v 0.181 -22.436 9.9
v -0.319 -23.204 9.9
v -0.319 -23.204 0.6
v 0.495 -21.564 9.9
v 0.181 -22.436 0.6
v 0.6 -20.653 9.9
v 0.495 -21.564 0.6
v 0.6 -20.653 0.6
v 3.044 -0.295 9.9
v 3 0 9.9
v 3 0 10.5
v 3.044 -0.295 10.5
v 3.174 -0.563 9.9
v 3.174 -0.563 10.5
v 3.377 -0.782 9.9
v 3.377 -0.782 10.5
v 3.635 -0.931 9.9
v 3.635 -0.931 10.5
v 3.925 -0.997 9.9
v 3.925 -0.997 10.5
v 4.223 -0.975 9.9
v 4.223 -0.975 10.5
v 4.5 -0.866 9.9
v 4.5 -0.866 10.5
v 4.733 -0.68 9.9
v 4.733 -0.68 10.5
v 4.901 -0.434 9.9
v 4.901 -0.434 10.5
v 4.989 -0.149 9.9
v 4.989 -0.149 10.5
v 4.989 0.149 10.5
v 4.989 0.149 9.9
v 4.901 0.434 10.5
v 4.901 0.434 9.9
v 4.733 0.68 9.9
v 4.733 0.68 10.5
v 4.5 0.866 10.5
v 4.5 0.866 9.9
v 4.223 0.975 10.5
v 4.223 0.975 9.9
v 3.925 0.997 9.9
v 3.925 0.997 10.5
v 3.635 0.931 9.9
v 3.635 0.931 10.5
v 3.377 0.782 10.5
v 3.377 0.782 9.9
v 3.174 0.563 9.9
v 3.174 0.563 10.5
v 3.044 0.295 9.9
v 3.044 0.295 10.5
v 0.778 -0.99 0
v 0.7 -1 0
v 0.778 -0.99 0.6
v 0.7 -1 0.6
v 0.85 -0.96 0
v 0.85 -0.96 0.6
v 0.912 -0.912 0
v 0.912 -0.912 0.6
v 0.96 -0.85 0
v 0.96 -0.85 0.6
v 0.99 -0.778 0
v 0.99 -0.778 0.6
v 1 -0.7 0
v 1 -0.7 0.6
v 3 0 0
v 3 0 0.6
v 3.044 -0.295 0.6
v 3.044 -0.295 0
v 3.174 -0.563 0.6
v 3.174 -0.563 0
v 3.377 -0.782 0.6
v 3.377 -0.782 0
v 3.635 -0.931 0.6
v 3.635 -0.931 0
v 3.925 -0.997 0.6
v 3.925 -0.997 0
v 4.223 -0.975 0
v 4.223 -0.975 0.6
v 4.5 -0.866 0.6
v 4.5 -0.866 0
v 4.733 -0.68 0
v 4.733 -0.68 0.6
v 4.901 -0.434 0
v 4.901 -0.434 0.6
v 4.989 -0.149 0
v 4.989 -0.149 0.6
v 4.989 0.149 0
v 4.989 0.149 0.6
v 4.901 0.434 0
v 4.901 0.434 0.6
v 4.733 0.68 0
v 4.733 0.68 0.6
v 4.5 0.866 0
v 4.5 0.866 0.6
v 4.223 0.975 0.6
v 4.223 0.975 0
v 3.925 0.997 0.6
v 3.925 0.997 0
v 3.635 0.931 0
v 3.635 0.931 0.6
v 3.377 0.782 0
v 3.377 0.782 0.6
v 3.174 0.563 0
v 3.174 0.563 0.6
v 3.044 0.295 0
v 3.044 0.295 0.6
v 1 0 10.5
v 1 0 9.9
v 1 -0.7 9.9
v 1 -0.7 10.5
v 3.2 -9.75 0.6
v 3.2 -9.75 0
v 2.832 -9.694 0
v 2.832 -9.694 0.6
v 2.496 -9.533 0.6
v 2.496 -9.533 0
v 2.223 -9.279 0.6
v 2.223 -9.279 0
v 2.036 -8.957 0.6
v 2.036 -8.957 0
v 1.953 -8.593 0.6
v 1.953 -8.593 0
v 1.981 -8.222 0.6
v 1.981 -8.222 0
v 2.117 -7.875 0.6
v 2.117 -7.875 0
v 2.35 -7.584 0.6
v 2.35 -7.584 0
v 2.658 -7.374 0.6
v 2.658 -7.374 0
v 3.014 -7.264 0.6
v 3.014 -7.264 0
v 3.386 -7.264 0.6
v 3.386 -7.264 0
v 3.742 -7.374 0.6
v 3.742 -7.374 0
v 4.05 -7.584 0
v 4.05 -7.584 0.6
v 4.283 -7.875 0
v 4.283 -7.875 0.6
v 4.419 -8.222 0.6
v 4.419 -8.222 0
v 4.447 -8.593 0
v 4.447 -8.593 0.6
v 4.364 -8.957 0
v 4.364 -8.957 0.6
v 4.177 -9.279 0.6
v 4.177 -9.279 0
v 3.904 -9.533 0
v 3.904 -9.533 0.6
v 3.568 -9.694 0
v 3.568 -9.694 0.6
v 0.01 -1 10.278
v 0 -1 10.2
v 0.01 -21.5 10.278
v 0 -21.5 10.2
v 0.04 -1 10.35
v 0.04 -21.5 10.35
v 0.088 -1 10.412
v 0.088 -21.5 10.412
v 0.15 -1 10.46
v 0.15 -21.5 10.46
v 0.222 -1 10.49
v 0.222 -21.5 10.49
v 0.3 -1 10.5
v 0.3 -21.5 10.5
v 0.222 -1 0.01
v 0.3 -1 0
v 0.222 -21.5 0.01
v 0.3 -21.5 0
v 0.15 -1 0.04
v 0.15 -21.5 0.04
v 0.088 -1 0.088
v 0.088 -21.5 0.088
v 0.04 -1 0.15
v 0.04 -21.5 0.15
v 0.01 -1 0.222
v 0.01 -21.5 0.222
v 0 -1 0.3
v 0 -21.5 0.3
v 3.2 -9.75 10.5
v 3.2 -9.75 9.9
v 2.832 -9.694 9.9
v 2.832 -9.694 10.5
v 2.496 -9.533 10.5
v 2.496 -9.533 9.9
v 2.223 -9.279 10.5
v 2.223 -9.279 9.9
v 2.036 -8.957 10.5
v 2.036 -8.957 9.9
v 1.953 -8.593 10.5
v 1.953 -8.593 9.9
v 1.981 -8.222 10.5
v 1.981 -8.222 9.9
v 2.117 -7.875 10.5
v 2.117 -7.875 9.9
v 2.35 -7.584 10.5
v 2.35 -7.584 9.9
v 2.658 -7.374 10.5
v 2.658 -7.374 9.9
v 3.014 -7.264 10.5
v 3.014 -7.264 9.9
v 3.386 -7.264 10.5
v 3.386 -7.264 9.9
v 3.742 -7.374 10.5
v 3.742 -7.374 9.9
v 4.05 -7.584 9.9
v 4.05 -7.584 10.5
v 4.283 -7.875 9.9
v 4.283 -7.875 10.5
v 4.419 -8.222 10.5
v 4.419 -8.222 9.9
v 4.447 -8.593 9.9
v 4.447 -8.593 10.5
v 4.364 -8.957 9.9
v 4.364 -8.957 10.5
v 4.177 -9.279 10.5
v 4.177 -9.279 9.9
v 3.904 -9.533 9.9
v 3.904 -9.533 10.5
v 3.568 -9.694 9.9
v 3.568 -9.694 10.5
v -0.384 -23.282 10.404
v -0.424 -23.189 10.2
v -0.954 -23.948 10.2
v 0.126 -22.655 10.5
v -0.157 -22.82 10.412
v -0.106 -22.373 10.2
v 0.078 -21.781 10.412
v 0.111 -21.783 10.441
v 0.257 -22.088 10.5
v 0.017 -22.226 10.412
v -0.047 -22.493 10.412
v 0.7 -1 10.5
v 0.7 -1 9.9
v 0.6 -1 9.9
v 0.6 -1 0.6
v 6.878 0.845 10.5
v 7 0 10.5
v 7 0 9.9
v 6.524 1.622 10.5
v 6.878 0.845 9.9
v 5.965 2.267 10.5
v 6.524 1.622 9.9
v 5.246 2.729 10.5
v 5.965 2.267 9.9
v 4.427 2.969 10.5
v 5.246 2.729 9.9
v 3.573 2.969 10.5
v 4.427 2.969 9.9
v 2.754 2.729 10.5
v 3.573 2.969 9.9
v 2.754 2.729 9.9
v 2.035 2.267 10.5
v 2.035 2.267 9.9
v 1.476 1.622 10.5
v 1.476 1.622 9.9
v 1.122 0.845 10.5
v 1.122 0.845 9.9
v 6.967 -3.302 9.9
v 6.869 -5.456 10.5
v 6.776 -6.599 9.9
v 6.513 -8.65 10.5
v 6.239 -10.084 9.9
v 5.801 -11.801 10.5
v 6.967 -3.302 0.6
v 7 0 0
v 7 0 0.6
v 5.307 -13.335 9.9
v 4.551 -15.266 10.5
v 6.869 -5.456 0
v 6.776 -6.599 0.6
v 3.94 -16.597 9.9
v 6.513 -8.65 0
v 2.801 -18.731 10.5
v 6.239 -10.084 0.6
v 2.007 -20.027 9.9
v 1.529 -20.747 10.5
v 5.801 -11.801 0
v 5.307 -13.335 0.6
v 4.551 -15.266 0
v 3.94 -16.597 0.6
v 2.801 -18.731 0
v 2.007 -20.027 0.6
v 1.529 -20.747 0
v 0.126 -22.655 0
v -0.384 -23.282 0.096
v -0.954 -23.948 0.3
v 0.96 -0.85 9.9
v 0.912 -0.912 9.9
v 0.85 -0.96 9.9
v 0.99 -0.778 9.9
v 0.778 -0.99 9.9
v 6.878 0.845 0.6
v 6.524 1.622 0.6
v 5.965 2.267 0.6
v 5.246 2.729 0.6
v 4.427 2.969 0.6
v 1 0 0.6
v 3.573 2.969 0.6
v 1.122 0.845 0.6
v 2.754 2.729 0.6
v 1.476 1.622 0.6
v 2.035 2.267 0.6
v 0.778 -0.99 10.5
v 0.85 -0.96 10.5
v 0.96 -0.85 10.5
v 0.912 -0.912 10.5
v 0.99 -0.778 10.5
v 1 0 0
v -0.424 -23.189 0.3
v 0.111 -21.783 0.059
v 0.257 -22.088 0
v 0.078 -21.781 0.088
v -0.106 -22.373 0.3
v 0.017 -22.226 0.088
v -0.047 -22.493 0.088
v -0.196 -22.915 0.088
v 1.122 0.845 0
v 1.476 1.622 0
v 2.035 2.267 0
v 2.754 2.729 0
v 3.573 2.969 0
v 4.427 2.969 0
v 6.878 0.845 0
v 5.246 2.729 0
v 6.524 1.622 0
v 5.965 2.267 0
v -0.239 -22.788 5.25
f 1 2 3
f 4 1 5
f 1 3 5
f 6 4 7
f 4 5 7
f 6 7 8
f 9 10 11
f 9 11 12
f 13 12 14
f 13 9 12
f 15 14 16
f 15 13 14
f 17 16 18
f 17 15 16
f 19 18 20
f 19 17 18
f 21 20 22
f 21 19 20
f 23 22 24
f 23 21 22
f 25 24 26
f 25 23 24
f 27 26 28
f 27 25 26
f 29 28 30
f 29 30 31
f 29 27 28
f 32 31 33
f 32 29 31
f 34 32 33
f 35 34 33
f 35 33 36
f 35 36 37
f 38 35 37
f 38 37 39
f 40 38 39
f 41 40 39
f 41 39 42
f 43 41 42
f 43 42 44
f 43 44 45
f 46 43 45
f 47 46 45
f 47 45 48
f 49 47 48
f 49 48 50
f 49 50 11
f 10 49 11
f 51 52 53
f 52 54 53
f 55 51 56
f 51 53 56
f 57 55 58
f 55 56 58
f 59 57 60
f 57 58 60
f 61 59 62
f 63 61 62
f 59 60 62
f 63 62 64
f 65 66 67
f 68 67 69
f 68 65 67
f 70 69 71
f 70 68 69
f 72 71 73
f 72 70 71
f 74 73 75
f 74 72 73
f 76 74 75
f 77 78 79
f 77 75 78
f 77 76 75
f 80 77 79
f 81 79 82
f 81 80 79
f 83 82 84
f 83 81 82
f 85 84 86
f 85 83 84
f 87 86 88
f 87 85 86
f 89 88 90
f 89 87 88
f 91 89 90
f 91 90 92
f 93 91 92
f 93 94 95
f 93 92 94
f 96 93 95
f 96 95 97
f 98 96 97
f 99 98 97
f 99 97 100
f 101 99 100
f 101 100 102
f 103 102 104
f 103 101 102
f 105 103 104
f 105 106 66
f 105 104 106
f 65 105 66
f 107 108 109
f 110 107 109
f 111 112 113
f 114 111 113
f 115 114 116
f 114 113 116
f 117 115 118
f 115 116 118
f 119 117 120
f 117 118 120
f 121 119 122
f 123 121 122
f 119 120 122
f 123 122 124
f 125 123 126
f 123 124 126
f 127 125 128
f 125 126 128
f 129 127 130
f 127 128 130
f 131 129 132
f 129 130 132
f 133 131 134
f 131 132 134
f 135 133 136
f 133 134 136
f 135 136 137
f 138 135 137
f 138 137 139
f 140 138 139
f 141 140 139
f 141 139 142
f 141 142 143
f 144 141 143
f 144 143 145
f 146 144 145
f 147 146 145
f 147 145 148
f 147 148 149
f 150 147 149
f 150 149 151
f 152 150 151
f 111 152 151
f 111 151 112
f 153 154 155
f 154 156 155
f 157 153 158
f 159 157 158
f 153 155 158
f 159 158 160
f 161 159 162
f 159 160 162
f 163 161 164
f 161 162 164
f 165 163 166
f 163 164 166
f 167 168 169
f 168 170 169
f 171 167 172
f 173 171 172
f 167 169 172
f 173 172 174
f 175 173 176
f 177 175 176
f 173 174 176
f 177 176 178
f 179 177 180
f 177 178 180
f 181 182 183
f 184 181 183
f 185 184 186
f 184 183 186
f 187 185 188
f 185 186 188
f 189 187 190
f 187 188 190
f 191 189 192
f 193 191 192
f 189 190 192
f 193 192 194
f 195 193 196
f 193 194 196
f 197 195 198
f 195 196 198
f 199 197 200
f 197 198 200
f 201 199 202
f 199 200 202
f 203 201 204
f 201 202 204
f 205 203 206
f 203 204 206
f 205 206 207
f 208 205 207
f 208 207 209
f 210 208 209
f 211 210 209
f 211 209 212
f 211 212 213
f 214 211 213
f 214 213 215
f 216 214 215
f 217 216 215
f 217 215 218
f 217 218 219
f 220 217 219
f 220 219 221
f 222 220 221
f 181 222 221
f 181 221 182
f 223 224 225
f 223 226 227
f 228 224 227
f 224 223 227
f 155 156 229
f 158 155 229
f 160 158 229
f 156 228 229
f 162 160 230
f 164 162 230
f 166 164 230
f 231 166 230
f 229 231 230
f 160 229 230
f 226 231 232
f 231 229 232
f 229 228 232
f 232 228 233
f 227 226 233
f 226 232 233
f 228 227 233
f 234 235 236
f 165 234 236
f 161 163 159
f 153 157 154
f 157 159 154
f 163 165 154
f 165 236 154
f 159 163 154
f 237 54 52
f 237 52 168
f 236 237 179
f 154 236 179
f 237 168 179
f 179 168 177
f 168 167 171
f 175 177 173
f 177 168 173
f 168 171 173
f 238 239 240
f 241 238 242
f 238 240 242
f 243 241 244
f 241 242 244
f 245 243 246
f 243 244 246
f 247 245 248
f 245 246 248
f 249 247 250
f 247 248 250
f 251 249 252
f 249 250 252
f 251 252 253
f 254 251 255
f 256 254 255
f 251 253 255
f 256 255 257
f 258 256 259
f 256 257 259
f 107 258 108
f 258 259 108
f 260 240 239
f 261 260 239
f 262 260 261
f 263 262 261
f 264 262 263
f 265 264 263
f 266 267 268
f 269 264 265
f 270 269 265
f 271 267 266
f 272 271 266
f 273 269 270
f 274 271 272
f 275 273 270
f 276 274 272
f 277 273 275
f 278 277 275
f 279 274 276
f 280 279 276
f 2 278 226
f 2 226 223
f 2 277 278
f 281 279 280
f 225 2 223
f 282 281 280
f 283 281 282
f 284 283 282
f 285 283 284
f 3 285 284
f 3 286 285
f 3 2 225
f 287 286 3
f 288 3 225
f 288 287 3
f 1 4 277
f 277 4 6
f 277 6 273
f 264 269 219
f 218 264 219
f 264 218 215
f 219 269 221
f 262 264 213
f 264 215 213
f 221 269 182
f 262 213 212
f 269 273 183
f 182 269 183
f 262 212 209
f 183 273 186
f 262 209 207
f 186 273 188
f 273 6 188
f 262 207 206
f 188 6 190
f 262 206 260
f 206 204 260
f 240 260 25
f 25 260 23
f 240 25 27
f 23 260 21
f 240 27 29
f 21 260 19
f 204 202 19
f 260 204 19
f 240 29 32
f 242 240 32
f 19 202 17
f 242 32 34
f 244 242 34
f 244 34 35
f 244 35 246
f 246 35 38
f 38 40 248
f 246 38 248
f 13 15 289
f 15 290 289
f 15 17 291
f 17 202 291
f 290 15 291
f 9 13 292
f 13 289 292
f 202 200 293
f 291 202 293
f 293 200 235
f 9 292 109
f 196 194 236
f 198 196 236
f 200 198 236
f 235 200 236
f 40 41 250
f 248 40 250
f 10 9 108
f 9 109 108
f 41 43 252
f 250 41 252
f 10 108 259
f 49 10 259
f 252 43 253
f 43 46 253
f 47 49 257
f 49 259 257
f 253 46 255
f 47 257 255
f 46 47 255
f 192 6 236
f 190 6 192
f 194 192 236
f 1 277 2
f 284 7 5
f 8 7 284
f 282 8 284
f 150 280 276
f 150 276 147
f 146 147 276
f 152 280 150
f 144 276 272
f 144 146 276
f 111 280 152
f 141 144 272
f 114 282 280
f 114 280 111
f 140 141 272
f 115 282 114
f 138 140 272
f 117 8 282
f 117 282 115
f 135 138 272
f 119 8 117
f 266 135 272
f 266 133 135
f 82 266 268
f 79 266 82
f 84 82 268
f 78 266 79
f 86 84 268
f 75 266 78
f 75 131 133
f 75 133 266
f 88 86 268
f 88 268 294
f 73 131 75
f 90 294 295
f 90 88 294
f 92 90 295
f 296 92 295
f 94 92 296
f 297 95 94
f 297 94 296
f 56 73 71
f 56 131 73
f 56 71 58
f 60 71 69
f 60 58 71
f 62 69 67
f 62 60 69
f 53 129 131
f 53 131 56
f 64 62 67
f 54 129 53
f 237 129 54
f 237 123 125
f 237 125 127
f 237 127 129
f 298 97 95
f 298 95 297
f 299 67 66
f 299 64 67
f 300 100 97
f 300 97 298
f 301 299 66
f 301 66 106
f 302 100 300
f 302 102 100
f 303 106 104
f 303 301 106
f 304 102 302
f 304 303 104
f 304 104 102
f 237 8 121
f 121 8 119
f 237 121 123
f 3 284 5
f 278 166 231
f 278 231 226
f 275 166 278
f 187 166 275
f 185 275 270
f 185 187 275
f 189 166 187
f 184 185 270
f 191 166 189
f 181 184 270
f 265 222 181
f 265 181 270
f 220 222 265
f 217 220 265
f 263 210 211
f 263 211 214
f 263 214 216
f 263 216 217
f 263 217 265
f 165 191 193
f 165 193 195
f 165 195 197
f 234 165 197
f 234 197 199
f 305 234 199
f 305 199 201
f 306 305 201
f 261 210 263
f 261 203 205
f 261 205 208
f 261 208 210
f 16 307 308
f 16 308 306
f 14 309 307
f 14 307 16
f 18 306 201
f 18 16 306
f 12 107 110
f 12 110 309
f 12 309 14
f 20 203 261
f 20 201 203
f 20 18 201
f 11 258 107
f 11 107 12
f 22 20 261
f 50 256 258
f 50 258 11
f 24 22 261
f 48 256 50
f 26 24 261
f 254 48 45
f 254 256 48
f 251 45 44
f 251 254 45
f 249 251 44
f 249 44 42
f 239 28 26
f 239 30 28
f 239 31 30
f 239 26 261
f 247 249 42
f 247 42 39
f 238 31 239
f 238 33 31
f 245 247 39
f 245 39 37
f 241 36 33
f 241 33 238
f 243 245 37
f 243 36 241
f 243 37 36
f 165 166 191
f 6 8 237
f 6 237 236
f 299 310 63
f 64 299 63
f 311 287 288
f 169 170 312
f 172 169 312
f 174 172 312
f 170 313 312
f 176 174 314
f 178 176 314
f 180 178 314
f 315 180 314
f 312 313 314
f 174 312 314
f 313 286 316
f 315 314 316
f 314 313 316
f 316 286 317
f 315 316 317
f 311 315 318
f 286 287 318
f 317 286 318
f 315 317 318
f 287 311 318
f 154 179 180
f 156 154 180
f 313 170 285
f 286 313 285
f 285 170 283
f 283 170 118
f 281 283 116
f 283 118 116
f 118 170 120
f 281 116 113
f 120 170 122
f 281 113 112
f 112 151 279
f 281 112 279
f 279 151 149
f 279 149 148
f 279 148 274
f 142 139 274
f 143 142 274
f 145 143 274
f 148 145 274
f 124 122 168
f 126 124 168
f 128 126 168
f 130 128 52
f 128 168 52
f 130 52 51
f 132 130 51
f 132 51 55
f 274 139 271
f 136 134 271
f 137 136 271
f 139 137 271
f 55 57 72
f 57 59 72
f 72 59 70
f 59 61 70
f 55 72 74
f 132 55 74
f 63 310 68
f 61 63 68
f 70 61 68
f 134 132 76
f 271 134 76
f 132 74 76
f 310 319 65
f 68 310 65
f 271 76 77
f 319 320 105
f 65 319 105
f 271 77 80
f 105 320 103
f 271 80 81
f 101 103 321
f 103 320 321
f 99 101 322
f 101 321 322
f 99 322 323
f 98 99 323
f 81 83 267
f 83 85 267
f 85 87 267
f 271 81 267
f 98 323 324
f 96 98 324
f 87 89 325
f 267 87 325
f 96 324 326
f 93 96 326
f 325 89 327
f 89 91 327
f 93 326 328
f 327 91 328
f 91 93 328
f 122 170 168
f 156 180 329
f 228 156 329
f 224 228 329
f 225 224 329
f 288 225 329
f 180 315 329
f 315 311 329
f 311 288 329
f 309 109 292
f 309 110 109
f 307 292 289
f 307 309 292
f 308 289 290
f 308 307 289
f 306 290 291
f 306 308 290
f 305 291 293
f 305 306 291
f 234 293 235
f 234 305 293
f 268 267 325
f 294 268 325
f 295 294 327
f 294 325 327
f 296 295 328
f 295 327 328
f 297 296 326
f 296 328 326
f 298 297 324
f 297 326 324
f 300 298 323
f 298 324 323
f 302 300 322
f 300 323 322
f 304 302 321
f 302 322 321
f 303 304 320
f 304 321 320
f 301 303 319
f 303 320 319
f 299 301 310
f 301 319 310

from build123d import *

# Parameters (mm, degrees)
SKETCH_1_R          = 1
EXTRUDE_1_DEPTH     = 10.5
SKETCH_2_W          = 9.3
SKETCH_2_H          = 27
CUT_EXTRUDE_1_DEPTH = 10.5
FILLET_1_R          = 4
FILLET_2_R          = 0.3
SKETCH_3_R          = 1.25
CUT_EXTRUDE_2_DEPTH = 19


with BuildPart() as part:
    # 草图1 → 凸台-拉伸1 (new body)
    with BuildSketch(Plane.XY):
        with BuildLine():
            ThreePointArc((7, 0), (4, 3), (1, 0))
            Line((1, 0), (1, -1))
            Line((1, -1), (0, -1))
            Line((0, -1), (0, -21.5))
            add(Edge.make_bspline(
                [(0, -21.5), (0, -22.851375424), (-0.954237794, -23.948160578)],
                knots=[0, 0, 0, 0.976850958, 0.976850958, 0.976850958], degree=2))
            add(Edge.make_bspline(
                [(7, 0), (7, -3.461774358), (6.888539552, -11.820950193), (2.535059444, -19.986776398), (-0.954237794, -23.948160578)],
                knots=[0, 0, 0, 0, 0.379767853, 0.997303013, 0.997303013, 0.997303013, 0.997303013], degree=3))
        make_face()
        with Locations(Location((4, 0, 0), (0, 0, 180))):
            Circle(SKETCH_1_R, mode=Mode.SUBTRACT)
    extrude(amount=EXTRUDE_1_DEPTH)

    # 草图2 → 切除-拉伸1 (cut)
    with BuildSketch(Plane.ZY.offset(-0.6)):
        with Locations((5.25, -10.44816051)):
            Rectangle(SKETCH_2_W, SKETCH_2_H)
    extrude(amount=-CUT_EXTRUDE_1_DEPTH, mode=Mode.SUBTRACT)

    # 圆角1
    fillet_1_edges = [part.edges().sort_by_distance(p)[0] for p in [
        (0.6, -22.041590232, 5.25),
    ]]
    fillet(fillet_1_edges, radius=FILLET_1_R)

    # 圆角2
    fillet_2_edges = [part.edges().sort_by_distance(p)[0] for p in [
        (0, -11.25, 10.5),
        (-0.248254444, -22.812327553, 0),
        (0, -11.25, 0),
        (1, -1, 10.2),
        (-0.248254444, -22.812327553, 10.5),
        (1, -1, 0.3),
    ]]
    fillet(fillet_2_edges, radius=FILLET_2_R)

    # 草图3 → 切除-拉伸2 (cut)
    with BuildSketch(Plane(origin=(0, 0, 0), x_dir=(-1, 0, 0), z_dir=(0, 0, -1))):
        with Locations(Location((-3.2, -8.5, 0), (0, 0, 270))):
            Circle(SKETCH_3_R)
    extrude(amount=-CUT_EXTRUDE_2_DEPTH, mode=Mode.SUBTRACT)


solid = part.part
